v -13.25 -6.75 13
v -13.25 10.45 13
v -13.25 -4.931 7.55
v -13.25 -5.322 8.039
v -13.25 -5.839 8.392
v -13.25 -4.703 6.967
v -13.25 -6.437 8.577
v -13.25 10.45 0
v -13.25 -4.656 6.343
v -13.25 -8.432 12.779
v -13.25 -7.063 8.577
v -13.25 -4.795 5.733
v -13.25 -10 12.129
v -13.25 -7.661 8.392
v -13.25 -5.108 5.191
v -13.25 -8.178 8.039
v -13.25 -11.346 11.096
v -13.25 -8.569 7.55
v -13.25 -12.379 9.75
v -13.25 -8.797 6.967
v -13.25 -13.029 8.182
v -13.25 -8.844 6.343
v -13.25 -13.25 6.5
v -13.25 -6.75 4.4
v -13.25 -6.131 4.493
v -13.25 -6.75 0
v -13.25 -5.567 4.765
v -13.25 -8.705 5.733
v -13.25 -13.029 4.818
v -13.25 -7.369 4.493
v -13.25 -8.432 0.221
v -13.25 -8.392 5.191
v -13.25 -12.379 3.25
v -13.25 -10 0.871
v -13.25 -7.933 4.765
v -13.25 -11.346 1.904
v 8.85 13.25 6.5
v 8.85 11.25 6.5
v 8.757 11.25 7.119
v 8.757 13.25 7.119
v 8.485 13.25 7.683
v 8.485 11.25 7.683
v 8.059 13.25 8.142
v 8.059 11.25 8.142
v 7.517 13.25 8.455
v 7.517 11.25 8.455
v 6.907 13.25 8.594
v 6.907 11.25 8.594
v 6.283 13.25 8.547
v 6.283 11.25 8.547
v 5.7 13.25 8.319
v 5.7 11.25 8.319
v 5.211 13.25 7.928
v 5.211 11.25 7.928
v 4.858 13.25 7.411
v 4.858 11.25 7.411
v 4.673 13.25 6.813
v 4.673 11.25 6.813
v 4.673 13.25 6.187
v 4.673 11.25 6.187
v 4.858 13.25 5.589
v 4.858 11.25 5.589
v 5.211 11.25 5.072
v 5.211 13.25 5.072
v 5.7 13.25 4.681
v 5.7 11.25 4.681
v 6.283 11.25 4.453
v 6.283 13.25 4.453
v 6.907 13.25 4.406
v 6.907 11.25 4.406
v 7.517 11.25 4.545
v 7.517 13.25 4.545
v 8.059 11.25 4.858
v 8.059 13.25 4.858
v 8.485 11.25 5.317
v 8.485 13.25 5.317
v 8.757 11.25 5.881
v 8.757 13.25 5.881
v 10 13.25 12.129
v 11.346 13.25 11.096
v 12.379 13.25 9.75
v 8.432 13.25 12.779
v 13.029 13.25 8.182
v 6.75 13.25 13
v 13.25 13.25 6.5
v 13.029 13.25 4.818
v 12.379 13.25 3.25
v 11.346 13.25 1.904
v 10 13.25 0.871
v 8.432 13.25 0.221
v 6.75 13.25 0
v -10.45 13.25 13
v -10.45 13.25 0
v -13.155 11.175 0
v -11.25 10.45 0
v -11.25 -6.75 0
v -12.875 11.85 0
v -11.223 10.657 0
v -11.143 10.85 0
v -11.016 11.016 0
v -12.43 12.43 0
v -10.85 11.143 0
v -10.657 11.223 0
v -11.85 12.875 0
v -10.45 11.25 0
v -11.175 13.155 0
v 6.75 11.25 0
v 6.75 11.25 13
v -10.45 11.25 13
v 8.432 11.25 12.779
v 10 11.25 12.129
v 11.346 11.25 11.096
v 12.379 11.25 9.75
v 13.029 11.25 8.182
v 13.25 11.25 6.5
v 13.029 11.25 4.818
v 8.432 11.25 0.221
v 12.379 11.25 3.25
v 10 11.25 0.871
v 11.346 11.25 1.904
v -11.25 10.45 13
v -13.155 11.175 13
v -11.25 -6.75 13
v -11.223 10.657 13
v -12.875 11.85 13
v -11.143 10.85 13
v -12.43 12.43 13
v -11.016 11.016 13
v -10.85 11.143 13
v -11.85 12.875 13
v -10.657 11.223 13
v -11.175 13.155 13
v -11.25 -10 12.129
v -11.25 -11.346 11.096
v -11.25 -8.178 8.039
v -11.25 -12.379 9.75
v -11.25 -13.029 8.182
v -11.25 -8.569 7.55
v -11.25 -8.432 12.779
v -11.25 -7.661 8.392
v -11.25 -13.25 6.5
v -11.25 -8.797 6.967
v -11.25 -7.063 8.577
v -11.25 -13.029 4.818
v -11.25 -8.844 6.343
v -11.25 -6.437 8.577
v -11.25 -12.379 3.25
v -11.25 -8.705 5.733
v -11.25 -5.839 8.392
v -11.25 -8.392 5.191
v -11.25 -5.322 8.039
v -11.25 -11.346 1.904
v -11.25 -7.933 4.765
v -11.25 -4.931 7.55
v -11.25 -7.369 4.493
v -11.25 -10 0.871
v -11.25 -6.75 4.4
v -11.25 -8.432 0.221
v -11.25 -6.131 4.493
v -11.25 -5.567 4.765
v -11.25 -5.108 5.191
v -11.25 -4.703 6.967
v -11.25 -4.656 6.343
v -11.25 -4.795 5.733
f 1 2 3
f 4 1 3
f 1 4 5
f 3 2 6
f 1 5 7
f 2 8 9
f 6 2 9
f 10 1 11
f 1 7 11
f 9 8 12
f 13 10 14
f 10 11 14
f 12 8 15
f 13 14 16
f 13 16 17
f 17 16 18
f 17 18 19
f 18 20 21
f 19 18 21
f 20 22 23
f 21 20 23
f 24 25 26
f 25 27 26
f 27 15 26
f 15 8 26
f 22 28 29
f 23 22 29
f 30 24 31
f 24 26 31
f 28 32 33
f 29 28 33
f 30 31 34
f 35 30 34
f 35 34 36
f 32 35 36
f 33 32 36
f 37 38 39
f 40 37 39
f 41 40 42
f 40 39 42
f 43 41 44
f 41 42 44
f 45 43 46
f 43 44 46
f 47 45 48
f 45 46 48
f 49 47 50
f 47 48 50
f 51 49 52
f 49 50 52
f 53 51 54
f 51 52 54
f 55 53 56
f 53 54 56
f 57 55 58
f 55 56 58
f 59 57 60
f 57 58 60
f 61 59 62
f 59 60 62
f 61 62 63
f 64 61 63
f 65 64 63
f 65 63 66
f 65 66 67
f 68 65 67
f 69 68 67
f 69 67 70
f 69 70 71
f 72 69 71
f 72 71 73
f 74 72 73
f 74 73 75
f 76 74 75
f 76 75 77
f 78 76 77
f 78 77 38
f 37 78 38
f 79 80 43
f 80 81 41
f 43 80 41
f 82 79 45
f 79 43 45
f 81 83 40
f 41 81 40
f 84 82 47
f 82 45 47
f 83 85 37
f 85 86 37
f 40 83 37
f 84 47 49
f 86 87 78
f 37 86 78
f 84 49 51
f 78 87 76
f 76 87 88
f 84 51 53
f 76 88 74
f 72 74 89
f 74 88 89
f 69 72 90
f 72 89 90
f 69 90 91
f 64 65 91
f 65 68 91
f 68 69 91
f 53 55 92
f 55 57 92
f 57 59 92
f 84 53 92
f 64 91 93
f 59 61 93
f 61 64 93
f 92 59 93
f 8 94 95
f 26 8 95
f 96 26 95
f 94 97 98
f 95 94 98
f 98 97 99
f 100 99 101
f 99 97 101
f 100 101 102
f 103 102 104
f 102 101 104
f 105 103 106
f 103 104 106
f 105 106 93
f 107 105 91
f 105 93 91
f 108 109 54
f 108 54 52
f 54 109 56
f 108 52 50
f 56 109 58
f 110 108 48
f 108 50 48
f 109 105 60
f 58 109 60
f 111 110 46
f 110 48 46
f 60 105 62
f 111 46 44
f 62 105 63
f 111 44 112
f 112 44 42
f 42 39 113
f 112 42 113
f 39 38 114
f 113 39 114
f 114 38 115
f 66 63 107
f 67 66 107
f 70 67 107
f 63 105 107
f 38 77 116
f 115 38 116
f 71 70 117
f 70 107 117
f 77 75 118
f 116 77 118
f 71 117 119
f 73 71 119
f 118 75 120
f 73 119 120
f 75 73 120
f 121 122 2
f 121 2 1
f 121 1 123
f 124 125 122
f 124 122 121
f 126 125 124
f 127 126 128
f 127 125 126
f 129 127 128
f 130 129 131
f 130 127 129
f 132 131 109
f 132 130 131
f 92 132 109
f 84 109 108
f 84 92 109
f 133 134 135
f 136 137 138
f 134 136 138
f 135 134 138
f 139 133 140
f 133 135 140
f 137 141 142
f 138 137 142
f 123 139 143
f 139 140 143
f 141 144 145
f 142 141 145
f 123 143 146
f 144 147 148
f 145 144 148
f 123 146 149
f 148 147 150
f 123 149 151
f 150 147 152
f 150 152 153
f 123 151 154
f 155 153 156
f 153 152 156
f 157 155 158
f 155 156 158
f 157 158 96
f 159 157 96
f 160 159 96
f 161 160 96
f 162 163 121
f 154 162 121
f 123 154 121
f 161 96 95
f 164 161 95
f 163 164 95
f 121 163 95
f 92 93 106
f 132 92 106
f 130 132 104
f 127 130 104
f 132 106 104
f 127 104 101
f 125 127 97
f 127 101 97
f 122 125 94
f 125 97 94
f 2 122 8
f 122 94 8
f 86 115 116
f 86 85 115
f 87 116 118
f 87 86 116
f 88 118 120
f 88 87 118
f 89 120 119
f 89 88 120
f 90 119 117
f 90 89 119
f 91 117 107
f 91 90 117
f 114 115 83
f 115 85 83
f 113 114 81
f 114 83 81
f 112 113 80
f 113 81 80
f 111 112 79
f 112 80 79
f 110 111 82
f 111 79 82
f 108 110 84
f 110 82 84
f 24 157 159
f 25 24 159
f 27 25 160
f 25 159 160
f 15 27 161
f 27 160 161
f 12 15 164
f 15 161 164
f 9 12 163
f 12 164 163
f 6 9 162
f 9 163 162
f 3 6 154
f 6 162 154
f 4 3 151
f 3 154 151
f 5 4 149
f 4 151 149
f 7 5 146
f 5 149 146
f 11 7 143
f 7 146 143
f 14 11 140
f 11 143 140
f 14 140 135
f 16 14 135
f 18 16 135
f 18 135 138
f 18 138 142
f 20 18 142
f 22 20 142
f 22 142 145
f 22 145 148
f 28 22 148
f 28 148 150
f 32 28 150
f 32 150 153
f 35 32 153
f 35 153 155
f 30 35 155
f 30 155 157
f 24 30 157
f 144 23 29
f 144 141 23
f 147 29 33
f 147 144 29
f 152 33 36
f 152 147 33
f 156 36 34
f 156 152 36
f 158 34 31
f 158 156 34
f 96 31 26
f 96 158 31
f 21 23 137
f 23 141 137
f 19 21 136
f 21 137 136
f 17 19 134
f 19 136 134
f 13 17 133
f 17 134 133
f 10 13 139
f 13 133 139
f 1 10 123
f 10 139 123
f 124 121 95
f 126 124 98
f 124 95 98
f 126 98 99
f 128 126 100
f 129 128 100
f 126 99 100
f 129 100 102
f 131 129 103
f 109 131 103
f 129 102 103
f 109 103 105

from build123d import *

# Parameters (mm, degrees)
BASE_FLANGE1_DEPTH    = 13
FILLET1_R             = 6.5
M5X0_8_TAPPED_HOLE1_D = 4.2
M5X0_8_TAPPED_HOLE2_D = 4.2


# Sheet-metal steps are written as plain solids
with BuildPart() as part:
    # Sketch1 → Base-Flange1 (new body)
    with BuildSketch(Plane.XY):
        with BuildLine():
            Line((13.25, 13.25), (-10.45, 13.25))
            ThreePointArc((-10.45, 13.25), (-12.429898987, 12.429898987), (-13.25, 10.45))
            Line((-13.25, 10.45), (-13.25, -13.25))
            Line((-13.25, -13.25), (-11.25, -13.25))
            Line((-11.25, -13.25), (-11.25, 10.45))
            ThreePointArc((-11.25, 10.45), (-11.015685425, 11.015685425), (-10.45, 11.25))
            Line((-10.45, 11.25), (13.25, 11.25))
            Line((13.25, 11.25), (13.25, 13.25))
        make_face()
    extrude(amount=BASE_FLANGE1_DEPTH)

    # Fillet1
    fillet1_edges = [part.edges().sort_by_distance(p)[0] for p in [
        (-12.25, -13.25, 0),
        (-12.25, -13.25, 13),
        (13.25, 12.25, 0),
        (13.25, 12.25, 13),
    ]]
    fillet(fillet1_edges, radius=FILLET1_R - 0.0001)  # a hair under: the kernel refuses the full size

    # M5x0.8 Tapped Hole1 (through all)
    with Locations(Plane(origin=(0, 13.25, 0), x_dir=(-1, 0, 0), z_dir=(0, 1, 0))):
        with Locations((-6.75, 6.5)):
            Hole(M5X0_8_TAPPED_HOLE1_D / 2)

    # M5x0.8 Tapped Hole2 (through all)
    with Locations(Plane.ZY.offset(13.25)):
        with Locations((6.5, -6.75)):
            Hole(M5X0_8_TAPPED_HOLE2_D / 2)


solid = part.part
